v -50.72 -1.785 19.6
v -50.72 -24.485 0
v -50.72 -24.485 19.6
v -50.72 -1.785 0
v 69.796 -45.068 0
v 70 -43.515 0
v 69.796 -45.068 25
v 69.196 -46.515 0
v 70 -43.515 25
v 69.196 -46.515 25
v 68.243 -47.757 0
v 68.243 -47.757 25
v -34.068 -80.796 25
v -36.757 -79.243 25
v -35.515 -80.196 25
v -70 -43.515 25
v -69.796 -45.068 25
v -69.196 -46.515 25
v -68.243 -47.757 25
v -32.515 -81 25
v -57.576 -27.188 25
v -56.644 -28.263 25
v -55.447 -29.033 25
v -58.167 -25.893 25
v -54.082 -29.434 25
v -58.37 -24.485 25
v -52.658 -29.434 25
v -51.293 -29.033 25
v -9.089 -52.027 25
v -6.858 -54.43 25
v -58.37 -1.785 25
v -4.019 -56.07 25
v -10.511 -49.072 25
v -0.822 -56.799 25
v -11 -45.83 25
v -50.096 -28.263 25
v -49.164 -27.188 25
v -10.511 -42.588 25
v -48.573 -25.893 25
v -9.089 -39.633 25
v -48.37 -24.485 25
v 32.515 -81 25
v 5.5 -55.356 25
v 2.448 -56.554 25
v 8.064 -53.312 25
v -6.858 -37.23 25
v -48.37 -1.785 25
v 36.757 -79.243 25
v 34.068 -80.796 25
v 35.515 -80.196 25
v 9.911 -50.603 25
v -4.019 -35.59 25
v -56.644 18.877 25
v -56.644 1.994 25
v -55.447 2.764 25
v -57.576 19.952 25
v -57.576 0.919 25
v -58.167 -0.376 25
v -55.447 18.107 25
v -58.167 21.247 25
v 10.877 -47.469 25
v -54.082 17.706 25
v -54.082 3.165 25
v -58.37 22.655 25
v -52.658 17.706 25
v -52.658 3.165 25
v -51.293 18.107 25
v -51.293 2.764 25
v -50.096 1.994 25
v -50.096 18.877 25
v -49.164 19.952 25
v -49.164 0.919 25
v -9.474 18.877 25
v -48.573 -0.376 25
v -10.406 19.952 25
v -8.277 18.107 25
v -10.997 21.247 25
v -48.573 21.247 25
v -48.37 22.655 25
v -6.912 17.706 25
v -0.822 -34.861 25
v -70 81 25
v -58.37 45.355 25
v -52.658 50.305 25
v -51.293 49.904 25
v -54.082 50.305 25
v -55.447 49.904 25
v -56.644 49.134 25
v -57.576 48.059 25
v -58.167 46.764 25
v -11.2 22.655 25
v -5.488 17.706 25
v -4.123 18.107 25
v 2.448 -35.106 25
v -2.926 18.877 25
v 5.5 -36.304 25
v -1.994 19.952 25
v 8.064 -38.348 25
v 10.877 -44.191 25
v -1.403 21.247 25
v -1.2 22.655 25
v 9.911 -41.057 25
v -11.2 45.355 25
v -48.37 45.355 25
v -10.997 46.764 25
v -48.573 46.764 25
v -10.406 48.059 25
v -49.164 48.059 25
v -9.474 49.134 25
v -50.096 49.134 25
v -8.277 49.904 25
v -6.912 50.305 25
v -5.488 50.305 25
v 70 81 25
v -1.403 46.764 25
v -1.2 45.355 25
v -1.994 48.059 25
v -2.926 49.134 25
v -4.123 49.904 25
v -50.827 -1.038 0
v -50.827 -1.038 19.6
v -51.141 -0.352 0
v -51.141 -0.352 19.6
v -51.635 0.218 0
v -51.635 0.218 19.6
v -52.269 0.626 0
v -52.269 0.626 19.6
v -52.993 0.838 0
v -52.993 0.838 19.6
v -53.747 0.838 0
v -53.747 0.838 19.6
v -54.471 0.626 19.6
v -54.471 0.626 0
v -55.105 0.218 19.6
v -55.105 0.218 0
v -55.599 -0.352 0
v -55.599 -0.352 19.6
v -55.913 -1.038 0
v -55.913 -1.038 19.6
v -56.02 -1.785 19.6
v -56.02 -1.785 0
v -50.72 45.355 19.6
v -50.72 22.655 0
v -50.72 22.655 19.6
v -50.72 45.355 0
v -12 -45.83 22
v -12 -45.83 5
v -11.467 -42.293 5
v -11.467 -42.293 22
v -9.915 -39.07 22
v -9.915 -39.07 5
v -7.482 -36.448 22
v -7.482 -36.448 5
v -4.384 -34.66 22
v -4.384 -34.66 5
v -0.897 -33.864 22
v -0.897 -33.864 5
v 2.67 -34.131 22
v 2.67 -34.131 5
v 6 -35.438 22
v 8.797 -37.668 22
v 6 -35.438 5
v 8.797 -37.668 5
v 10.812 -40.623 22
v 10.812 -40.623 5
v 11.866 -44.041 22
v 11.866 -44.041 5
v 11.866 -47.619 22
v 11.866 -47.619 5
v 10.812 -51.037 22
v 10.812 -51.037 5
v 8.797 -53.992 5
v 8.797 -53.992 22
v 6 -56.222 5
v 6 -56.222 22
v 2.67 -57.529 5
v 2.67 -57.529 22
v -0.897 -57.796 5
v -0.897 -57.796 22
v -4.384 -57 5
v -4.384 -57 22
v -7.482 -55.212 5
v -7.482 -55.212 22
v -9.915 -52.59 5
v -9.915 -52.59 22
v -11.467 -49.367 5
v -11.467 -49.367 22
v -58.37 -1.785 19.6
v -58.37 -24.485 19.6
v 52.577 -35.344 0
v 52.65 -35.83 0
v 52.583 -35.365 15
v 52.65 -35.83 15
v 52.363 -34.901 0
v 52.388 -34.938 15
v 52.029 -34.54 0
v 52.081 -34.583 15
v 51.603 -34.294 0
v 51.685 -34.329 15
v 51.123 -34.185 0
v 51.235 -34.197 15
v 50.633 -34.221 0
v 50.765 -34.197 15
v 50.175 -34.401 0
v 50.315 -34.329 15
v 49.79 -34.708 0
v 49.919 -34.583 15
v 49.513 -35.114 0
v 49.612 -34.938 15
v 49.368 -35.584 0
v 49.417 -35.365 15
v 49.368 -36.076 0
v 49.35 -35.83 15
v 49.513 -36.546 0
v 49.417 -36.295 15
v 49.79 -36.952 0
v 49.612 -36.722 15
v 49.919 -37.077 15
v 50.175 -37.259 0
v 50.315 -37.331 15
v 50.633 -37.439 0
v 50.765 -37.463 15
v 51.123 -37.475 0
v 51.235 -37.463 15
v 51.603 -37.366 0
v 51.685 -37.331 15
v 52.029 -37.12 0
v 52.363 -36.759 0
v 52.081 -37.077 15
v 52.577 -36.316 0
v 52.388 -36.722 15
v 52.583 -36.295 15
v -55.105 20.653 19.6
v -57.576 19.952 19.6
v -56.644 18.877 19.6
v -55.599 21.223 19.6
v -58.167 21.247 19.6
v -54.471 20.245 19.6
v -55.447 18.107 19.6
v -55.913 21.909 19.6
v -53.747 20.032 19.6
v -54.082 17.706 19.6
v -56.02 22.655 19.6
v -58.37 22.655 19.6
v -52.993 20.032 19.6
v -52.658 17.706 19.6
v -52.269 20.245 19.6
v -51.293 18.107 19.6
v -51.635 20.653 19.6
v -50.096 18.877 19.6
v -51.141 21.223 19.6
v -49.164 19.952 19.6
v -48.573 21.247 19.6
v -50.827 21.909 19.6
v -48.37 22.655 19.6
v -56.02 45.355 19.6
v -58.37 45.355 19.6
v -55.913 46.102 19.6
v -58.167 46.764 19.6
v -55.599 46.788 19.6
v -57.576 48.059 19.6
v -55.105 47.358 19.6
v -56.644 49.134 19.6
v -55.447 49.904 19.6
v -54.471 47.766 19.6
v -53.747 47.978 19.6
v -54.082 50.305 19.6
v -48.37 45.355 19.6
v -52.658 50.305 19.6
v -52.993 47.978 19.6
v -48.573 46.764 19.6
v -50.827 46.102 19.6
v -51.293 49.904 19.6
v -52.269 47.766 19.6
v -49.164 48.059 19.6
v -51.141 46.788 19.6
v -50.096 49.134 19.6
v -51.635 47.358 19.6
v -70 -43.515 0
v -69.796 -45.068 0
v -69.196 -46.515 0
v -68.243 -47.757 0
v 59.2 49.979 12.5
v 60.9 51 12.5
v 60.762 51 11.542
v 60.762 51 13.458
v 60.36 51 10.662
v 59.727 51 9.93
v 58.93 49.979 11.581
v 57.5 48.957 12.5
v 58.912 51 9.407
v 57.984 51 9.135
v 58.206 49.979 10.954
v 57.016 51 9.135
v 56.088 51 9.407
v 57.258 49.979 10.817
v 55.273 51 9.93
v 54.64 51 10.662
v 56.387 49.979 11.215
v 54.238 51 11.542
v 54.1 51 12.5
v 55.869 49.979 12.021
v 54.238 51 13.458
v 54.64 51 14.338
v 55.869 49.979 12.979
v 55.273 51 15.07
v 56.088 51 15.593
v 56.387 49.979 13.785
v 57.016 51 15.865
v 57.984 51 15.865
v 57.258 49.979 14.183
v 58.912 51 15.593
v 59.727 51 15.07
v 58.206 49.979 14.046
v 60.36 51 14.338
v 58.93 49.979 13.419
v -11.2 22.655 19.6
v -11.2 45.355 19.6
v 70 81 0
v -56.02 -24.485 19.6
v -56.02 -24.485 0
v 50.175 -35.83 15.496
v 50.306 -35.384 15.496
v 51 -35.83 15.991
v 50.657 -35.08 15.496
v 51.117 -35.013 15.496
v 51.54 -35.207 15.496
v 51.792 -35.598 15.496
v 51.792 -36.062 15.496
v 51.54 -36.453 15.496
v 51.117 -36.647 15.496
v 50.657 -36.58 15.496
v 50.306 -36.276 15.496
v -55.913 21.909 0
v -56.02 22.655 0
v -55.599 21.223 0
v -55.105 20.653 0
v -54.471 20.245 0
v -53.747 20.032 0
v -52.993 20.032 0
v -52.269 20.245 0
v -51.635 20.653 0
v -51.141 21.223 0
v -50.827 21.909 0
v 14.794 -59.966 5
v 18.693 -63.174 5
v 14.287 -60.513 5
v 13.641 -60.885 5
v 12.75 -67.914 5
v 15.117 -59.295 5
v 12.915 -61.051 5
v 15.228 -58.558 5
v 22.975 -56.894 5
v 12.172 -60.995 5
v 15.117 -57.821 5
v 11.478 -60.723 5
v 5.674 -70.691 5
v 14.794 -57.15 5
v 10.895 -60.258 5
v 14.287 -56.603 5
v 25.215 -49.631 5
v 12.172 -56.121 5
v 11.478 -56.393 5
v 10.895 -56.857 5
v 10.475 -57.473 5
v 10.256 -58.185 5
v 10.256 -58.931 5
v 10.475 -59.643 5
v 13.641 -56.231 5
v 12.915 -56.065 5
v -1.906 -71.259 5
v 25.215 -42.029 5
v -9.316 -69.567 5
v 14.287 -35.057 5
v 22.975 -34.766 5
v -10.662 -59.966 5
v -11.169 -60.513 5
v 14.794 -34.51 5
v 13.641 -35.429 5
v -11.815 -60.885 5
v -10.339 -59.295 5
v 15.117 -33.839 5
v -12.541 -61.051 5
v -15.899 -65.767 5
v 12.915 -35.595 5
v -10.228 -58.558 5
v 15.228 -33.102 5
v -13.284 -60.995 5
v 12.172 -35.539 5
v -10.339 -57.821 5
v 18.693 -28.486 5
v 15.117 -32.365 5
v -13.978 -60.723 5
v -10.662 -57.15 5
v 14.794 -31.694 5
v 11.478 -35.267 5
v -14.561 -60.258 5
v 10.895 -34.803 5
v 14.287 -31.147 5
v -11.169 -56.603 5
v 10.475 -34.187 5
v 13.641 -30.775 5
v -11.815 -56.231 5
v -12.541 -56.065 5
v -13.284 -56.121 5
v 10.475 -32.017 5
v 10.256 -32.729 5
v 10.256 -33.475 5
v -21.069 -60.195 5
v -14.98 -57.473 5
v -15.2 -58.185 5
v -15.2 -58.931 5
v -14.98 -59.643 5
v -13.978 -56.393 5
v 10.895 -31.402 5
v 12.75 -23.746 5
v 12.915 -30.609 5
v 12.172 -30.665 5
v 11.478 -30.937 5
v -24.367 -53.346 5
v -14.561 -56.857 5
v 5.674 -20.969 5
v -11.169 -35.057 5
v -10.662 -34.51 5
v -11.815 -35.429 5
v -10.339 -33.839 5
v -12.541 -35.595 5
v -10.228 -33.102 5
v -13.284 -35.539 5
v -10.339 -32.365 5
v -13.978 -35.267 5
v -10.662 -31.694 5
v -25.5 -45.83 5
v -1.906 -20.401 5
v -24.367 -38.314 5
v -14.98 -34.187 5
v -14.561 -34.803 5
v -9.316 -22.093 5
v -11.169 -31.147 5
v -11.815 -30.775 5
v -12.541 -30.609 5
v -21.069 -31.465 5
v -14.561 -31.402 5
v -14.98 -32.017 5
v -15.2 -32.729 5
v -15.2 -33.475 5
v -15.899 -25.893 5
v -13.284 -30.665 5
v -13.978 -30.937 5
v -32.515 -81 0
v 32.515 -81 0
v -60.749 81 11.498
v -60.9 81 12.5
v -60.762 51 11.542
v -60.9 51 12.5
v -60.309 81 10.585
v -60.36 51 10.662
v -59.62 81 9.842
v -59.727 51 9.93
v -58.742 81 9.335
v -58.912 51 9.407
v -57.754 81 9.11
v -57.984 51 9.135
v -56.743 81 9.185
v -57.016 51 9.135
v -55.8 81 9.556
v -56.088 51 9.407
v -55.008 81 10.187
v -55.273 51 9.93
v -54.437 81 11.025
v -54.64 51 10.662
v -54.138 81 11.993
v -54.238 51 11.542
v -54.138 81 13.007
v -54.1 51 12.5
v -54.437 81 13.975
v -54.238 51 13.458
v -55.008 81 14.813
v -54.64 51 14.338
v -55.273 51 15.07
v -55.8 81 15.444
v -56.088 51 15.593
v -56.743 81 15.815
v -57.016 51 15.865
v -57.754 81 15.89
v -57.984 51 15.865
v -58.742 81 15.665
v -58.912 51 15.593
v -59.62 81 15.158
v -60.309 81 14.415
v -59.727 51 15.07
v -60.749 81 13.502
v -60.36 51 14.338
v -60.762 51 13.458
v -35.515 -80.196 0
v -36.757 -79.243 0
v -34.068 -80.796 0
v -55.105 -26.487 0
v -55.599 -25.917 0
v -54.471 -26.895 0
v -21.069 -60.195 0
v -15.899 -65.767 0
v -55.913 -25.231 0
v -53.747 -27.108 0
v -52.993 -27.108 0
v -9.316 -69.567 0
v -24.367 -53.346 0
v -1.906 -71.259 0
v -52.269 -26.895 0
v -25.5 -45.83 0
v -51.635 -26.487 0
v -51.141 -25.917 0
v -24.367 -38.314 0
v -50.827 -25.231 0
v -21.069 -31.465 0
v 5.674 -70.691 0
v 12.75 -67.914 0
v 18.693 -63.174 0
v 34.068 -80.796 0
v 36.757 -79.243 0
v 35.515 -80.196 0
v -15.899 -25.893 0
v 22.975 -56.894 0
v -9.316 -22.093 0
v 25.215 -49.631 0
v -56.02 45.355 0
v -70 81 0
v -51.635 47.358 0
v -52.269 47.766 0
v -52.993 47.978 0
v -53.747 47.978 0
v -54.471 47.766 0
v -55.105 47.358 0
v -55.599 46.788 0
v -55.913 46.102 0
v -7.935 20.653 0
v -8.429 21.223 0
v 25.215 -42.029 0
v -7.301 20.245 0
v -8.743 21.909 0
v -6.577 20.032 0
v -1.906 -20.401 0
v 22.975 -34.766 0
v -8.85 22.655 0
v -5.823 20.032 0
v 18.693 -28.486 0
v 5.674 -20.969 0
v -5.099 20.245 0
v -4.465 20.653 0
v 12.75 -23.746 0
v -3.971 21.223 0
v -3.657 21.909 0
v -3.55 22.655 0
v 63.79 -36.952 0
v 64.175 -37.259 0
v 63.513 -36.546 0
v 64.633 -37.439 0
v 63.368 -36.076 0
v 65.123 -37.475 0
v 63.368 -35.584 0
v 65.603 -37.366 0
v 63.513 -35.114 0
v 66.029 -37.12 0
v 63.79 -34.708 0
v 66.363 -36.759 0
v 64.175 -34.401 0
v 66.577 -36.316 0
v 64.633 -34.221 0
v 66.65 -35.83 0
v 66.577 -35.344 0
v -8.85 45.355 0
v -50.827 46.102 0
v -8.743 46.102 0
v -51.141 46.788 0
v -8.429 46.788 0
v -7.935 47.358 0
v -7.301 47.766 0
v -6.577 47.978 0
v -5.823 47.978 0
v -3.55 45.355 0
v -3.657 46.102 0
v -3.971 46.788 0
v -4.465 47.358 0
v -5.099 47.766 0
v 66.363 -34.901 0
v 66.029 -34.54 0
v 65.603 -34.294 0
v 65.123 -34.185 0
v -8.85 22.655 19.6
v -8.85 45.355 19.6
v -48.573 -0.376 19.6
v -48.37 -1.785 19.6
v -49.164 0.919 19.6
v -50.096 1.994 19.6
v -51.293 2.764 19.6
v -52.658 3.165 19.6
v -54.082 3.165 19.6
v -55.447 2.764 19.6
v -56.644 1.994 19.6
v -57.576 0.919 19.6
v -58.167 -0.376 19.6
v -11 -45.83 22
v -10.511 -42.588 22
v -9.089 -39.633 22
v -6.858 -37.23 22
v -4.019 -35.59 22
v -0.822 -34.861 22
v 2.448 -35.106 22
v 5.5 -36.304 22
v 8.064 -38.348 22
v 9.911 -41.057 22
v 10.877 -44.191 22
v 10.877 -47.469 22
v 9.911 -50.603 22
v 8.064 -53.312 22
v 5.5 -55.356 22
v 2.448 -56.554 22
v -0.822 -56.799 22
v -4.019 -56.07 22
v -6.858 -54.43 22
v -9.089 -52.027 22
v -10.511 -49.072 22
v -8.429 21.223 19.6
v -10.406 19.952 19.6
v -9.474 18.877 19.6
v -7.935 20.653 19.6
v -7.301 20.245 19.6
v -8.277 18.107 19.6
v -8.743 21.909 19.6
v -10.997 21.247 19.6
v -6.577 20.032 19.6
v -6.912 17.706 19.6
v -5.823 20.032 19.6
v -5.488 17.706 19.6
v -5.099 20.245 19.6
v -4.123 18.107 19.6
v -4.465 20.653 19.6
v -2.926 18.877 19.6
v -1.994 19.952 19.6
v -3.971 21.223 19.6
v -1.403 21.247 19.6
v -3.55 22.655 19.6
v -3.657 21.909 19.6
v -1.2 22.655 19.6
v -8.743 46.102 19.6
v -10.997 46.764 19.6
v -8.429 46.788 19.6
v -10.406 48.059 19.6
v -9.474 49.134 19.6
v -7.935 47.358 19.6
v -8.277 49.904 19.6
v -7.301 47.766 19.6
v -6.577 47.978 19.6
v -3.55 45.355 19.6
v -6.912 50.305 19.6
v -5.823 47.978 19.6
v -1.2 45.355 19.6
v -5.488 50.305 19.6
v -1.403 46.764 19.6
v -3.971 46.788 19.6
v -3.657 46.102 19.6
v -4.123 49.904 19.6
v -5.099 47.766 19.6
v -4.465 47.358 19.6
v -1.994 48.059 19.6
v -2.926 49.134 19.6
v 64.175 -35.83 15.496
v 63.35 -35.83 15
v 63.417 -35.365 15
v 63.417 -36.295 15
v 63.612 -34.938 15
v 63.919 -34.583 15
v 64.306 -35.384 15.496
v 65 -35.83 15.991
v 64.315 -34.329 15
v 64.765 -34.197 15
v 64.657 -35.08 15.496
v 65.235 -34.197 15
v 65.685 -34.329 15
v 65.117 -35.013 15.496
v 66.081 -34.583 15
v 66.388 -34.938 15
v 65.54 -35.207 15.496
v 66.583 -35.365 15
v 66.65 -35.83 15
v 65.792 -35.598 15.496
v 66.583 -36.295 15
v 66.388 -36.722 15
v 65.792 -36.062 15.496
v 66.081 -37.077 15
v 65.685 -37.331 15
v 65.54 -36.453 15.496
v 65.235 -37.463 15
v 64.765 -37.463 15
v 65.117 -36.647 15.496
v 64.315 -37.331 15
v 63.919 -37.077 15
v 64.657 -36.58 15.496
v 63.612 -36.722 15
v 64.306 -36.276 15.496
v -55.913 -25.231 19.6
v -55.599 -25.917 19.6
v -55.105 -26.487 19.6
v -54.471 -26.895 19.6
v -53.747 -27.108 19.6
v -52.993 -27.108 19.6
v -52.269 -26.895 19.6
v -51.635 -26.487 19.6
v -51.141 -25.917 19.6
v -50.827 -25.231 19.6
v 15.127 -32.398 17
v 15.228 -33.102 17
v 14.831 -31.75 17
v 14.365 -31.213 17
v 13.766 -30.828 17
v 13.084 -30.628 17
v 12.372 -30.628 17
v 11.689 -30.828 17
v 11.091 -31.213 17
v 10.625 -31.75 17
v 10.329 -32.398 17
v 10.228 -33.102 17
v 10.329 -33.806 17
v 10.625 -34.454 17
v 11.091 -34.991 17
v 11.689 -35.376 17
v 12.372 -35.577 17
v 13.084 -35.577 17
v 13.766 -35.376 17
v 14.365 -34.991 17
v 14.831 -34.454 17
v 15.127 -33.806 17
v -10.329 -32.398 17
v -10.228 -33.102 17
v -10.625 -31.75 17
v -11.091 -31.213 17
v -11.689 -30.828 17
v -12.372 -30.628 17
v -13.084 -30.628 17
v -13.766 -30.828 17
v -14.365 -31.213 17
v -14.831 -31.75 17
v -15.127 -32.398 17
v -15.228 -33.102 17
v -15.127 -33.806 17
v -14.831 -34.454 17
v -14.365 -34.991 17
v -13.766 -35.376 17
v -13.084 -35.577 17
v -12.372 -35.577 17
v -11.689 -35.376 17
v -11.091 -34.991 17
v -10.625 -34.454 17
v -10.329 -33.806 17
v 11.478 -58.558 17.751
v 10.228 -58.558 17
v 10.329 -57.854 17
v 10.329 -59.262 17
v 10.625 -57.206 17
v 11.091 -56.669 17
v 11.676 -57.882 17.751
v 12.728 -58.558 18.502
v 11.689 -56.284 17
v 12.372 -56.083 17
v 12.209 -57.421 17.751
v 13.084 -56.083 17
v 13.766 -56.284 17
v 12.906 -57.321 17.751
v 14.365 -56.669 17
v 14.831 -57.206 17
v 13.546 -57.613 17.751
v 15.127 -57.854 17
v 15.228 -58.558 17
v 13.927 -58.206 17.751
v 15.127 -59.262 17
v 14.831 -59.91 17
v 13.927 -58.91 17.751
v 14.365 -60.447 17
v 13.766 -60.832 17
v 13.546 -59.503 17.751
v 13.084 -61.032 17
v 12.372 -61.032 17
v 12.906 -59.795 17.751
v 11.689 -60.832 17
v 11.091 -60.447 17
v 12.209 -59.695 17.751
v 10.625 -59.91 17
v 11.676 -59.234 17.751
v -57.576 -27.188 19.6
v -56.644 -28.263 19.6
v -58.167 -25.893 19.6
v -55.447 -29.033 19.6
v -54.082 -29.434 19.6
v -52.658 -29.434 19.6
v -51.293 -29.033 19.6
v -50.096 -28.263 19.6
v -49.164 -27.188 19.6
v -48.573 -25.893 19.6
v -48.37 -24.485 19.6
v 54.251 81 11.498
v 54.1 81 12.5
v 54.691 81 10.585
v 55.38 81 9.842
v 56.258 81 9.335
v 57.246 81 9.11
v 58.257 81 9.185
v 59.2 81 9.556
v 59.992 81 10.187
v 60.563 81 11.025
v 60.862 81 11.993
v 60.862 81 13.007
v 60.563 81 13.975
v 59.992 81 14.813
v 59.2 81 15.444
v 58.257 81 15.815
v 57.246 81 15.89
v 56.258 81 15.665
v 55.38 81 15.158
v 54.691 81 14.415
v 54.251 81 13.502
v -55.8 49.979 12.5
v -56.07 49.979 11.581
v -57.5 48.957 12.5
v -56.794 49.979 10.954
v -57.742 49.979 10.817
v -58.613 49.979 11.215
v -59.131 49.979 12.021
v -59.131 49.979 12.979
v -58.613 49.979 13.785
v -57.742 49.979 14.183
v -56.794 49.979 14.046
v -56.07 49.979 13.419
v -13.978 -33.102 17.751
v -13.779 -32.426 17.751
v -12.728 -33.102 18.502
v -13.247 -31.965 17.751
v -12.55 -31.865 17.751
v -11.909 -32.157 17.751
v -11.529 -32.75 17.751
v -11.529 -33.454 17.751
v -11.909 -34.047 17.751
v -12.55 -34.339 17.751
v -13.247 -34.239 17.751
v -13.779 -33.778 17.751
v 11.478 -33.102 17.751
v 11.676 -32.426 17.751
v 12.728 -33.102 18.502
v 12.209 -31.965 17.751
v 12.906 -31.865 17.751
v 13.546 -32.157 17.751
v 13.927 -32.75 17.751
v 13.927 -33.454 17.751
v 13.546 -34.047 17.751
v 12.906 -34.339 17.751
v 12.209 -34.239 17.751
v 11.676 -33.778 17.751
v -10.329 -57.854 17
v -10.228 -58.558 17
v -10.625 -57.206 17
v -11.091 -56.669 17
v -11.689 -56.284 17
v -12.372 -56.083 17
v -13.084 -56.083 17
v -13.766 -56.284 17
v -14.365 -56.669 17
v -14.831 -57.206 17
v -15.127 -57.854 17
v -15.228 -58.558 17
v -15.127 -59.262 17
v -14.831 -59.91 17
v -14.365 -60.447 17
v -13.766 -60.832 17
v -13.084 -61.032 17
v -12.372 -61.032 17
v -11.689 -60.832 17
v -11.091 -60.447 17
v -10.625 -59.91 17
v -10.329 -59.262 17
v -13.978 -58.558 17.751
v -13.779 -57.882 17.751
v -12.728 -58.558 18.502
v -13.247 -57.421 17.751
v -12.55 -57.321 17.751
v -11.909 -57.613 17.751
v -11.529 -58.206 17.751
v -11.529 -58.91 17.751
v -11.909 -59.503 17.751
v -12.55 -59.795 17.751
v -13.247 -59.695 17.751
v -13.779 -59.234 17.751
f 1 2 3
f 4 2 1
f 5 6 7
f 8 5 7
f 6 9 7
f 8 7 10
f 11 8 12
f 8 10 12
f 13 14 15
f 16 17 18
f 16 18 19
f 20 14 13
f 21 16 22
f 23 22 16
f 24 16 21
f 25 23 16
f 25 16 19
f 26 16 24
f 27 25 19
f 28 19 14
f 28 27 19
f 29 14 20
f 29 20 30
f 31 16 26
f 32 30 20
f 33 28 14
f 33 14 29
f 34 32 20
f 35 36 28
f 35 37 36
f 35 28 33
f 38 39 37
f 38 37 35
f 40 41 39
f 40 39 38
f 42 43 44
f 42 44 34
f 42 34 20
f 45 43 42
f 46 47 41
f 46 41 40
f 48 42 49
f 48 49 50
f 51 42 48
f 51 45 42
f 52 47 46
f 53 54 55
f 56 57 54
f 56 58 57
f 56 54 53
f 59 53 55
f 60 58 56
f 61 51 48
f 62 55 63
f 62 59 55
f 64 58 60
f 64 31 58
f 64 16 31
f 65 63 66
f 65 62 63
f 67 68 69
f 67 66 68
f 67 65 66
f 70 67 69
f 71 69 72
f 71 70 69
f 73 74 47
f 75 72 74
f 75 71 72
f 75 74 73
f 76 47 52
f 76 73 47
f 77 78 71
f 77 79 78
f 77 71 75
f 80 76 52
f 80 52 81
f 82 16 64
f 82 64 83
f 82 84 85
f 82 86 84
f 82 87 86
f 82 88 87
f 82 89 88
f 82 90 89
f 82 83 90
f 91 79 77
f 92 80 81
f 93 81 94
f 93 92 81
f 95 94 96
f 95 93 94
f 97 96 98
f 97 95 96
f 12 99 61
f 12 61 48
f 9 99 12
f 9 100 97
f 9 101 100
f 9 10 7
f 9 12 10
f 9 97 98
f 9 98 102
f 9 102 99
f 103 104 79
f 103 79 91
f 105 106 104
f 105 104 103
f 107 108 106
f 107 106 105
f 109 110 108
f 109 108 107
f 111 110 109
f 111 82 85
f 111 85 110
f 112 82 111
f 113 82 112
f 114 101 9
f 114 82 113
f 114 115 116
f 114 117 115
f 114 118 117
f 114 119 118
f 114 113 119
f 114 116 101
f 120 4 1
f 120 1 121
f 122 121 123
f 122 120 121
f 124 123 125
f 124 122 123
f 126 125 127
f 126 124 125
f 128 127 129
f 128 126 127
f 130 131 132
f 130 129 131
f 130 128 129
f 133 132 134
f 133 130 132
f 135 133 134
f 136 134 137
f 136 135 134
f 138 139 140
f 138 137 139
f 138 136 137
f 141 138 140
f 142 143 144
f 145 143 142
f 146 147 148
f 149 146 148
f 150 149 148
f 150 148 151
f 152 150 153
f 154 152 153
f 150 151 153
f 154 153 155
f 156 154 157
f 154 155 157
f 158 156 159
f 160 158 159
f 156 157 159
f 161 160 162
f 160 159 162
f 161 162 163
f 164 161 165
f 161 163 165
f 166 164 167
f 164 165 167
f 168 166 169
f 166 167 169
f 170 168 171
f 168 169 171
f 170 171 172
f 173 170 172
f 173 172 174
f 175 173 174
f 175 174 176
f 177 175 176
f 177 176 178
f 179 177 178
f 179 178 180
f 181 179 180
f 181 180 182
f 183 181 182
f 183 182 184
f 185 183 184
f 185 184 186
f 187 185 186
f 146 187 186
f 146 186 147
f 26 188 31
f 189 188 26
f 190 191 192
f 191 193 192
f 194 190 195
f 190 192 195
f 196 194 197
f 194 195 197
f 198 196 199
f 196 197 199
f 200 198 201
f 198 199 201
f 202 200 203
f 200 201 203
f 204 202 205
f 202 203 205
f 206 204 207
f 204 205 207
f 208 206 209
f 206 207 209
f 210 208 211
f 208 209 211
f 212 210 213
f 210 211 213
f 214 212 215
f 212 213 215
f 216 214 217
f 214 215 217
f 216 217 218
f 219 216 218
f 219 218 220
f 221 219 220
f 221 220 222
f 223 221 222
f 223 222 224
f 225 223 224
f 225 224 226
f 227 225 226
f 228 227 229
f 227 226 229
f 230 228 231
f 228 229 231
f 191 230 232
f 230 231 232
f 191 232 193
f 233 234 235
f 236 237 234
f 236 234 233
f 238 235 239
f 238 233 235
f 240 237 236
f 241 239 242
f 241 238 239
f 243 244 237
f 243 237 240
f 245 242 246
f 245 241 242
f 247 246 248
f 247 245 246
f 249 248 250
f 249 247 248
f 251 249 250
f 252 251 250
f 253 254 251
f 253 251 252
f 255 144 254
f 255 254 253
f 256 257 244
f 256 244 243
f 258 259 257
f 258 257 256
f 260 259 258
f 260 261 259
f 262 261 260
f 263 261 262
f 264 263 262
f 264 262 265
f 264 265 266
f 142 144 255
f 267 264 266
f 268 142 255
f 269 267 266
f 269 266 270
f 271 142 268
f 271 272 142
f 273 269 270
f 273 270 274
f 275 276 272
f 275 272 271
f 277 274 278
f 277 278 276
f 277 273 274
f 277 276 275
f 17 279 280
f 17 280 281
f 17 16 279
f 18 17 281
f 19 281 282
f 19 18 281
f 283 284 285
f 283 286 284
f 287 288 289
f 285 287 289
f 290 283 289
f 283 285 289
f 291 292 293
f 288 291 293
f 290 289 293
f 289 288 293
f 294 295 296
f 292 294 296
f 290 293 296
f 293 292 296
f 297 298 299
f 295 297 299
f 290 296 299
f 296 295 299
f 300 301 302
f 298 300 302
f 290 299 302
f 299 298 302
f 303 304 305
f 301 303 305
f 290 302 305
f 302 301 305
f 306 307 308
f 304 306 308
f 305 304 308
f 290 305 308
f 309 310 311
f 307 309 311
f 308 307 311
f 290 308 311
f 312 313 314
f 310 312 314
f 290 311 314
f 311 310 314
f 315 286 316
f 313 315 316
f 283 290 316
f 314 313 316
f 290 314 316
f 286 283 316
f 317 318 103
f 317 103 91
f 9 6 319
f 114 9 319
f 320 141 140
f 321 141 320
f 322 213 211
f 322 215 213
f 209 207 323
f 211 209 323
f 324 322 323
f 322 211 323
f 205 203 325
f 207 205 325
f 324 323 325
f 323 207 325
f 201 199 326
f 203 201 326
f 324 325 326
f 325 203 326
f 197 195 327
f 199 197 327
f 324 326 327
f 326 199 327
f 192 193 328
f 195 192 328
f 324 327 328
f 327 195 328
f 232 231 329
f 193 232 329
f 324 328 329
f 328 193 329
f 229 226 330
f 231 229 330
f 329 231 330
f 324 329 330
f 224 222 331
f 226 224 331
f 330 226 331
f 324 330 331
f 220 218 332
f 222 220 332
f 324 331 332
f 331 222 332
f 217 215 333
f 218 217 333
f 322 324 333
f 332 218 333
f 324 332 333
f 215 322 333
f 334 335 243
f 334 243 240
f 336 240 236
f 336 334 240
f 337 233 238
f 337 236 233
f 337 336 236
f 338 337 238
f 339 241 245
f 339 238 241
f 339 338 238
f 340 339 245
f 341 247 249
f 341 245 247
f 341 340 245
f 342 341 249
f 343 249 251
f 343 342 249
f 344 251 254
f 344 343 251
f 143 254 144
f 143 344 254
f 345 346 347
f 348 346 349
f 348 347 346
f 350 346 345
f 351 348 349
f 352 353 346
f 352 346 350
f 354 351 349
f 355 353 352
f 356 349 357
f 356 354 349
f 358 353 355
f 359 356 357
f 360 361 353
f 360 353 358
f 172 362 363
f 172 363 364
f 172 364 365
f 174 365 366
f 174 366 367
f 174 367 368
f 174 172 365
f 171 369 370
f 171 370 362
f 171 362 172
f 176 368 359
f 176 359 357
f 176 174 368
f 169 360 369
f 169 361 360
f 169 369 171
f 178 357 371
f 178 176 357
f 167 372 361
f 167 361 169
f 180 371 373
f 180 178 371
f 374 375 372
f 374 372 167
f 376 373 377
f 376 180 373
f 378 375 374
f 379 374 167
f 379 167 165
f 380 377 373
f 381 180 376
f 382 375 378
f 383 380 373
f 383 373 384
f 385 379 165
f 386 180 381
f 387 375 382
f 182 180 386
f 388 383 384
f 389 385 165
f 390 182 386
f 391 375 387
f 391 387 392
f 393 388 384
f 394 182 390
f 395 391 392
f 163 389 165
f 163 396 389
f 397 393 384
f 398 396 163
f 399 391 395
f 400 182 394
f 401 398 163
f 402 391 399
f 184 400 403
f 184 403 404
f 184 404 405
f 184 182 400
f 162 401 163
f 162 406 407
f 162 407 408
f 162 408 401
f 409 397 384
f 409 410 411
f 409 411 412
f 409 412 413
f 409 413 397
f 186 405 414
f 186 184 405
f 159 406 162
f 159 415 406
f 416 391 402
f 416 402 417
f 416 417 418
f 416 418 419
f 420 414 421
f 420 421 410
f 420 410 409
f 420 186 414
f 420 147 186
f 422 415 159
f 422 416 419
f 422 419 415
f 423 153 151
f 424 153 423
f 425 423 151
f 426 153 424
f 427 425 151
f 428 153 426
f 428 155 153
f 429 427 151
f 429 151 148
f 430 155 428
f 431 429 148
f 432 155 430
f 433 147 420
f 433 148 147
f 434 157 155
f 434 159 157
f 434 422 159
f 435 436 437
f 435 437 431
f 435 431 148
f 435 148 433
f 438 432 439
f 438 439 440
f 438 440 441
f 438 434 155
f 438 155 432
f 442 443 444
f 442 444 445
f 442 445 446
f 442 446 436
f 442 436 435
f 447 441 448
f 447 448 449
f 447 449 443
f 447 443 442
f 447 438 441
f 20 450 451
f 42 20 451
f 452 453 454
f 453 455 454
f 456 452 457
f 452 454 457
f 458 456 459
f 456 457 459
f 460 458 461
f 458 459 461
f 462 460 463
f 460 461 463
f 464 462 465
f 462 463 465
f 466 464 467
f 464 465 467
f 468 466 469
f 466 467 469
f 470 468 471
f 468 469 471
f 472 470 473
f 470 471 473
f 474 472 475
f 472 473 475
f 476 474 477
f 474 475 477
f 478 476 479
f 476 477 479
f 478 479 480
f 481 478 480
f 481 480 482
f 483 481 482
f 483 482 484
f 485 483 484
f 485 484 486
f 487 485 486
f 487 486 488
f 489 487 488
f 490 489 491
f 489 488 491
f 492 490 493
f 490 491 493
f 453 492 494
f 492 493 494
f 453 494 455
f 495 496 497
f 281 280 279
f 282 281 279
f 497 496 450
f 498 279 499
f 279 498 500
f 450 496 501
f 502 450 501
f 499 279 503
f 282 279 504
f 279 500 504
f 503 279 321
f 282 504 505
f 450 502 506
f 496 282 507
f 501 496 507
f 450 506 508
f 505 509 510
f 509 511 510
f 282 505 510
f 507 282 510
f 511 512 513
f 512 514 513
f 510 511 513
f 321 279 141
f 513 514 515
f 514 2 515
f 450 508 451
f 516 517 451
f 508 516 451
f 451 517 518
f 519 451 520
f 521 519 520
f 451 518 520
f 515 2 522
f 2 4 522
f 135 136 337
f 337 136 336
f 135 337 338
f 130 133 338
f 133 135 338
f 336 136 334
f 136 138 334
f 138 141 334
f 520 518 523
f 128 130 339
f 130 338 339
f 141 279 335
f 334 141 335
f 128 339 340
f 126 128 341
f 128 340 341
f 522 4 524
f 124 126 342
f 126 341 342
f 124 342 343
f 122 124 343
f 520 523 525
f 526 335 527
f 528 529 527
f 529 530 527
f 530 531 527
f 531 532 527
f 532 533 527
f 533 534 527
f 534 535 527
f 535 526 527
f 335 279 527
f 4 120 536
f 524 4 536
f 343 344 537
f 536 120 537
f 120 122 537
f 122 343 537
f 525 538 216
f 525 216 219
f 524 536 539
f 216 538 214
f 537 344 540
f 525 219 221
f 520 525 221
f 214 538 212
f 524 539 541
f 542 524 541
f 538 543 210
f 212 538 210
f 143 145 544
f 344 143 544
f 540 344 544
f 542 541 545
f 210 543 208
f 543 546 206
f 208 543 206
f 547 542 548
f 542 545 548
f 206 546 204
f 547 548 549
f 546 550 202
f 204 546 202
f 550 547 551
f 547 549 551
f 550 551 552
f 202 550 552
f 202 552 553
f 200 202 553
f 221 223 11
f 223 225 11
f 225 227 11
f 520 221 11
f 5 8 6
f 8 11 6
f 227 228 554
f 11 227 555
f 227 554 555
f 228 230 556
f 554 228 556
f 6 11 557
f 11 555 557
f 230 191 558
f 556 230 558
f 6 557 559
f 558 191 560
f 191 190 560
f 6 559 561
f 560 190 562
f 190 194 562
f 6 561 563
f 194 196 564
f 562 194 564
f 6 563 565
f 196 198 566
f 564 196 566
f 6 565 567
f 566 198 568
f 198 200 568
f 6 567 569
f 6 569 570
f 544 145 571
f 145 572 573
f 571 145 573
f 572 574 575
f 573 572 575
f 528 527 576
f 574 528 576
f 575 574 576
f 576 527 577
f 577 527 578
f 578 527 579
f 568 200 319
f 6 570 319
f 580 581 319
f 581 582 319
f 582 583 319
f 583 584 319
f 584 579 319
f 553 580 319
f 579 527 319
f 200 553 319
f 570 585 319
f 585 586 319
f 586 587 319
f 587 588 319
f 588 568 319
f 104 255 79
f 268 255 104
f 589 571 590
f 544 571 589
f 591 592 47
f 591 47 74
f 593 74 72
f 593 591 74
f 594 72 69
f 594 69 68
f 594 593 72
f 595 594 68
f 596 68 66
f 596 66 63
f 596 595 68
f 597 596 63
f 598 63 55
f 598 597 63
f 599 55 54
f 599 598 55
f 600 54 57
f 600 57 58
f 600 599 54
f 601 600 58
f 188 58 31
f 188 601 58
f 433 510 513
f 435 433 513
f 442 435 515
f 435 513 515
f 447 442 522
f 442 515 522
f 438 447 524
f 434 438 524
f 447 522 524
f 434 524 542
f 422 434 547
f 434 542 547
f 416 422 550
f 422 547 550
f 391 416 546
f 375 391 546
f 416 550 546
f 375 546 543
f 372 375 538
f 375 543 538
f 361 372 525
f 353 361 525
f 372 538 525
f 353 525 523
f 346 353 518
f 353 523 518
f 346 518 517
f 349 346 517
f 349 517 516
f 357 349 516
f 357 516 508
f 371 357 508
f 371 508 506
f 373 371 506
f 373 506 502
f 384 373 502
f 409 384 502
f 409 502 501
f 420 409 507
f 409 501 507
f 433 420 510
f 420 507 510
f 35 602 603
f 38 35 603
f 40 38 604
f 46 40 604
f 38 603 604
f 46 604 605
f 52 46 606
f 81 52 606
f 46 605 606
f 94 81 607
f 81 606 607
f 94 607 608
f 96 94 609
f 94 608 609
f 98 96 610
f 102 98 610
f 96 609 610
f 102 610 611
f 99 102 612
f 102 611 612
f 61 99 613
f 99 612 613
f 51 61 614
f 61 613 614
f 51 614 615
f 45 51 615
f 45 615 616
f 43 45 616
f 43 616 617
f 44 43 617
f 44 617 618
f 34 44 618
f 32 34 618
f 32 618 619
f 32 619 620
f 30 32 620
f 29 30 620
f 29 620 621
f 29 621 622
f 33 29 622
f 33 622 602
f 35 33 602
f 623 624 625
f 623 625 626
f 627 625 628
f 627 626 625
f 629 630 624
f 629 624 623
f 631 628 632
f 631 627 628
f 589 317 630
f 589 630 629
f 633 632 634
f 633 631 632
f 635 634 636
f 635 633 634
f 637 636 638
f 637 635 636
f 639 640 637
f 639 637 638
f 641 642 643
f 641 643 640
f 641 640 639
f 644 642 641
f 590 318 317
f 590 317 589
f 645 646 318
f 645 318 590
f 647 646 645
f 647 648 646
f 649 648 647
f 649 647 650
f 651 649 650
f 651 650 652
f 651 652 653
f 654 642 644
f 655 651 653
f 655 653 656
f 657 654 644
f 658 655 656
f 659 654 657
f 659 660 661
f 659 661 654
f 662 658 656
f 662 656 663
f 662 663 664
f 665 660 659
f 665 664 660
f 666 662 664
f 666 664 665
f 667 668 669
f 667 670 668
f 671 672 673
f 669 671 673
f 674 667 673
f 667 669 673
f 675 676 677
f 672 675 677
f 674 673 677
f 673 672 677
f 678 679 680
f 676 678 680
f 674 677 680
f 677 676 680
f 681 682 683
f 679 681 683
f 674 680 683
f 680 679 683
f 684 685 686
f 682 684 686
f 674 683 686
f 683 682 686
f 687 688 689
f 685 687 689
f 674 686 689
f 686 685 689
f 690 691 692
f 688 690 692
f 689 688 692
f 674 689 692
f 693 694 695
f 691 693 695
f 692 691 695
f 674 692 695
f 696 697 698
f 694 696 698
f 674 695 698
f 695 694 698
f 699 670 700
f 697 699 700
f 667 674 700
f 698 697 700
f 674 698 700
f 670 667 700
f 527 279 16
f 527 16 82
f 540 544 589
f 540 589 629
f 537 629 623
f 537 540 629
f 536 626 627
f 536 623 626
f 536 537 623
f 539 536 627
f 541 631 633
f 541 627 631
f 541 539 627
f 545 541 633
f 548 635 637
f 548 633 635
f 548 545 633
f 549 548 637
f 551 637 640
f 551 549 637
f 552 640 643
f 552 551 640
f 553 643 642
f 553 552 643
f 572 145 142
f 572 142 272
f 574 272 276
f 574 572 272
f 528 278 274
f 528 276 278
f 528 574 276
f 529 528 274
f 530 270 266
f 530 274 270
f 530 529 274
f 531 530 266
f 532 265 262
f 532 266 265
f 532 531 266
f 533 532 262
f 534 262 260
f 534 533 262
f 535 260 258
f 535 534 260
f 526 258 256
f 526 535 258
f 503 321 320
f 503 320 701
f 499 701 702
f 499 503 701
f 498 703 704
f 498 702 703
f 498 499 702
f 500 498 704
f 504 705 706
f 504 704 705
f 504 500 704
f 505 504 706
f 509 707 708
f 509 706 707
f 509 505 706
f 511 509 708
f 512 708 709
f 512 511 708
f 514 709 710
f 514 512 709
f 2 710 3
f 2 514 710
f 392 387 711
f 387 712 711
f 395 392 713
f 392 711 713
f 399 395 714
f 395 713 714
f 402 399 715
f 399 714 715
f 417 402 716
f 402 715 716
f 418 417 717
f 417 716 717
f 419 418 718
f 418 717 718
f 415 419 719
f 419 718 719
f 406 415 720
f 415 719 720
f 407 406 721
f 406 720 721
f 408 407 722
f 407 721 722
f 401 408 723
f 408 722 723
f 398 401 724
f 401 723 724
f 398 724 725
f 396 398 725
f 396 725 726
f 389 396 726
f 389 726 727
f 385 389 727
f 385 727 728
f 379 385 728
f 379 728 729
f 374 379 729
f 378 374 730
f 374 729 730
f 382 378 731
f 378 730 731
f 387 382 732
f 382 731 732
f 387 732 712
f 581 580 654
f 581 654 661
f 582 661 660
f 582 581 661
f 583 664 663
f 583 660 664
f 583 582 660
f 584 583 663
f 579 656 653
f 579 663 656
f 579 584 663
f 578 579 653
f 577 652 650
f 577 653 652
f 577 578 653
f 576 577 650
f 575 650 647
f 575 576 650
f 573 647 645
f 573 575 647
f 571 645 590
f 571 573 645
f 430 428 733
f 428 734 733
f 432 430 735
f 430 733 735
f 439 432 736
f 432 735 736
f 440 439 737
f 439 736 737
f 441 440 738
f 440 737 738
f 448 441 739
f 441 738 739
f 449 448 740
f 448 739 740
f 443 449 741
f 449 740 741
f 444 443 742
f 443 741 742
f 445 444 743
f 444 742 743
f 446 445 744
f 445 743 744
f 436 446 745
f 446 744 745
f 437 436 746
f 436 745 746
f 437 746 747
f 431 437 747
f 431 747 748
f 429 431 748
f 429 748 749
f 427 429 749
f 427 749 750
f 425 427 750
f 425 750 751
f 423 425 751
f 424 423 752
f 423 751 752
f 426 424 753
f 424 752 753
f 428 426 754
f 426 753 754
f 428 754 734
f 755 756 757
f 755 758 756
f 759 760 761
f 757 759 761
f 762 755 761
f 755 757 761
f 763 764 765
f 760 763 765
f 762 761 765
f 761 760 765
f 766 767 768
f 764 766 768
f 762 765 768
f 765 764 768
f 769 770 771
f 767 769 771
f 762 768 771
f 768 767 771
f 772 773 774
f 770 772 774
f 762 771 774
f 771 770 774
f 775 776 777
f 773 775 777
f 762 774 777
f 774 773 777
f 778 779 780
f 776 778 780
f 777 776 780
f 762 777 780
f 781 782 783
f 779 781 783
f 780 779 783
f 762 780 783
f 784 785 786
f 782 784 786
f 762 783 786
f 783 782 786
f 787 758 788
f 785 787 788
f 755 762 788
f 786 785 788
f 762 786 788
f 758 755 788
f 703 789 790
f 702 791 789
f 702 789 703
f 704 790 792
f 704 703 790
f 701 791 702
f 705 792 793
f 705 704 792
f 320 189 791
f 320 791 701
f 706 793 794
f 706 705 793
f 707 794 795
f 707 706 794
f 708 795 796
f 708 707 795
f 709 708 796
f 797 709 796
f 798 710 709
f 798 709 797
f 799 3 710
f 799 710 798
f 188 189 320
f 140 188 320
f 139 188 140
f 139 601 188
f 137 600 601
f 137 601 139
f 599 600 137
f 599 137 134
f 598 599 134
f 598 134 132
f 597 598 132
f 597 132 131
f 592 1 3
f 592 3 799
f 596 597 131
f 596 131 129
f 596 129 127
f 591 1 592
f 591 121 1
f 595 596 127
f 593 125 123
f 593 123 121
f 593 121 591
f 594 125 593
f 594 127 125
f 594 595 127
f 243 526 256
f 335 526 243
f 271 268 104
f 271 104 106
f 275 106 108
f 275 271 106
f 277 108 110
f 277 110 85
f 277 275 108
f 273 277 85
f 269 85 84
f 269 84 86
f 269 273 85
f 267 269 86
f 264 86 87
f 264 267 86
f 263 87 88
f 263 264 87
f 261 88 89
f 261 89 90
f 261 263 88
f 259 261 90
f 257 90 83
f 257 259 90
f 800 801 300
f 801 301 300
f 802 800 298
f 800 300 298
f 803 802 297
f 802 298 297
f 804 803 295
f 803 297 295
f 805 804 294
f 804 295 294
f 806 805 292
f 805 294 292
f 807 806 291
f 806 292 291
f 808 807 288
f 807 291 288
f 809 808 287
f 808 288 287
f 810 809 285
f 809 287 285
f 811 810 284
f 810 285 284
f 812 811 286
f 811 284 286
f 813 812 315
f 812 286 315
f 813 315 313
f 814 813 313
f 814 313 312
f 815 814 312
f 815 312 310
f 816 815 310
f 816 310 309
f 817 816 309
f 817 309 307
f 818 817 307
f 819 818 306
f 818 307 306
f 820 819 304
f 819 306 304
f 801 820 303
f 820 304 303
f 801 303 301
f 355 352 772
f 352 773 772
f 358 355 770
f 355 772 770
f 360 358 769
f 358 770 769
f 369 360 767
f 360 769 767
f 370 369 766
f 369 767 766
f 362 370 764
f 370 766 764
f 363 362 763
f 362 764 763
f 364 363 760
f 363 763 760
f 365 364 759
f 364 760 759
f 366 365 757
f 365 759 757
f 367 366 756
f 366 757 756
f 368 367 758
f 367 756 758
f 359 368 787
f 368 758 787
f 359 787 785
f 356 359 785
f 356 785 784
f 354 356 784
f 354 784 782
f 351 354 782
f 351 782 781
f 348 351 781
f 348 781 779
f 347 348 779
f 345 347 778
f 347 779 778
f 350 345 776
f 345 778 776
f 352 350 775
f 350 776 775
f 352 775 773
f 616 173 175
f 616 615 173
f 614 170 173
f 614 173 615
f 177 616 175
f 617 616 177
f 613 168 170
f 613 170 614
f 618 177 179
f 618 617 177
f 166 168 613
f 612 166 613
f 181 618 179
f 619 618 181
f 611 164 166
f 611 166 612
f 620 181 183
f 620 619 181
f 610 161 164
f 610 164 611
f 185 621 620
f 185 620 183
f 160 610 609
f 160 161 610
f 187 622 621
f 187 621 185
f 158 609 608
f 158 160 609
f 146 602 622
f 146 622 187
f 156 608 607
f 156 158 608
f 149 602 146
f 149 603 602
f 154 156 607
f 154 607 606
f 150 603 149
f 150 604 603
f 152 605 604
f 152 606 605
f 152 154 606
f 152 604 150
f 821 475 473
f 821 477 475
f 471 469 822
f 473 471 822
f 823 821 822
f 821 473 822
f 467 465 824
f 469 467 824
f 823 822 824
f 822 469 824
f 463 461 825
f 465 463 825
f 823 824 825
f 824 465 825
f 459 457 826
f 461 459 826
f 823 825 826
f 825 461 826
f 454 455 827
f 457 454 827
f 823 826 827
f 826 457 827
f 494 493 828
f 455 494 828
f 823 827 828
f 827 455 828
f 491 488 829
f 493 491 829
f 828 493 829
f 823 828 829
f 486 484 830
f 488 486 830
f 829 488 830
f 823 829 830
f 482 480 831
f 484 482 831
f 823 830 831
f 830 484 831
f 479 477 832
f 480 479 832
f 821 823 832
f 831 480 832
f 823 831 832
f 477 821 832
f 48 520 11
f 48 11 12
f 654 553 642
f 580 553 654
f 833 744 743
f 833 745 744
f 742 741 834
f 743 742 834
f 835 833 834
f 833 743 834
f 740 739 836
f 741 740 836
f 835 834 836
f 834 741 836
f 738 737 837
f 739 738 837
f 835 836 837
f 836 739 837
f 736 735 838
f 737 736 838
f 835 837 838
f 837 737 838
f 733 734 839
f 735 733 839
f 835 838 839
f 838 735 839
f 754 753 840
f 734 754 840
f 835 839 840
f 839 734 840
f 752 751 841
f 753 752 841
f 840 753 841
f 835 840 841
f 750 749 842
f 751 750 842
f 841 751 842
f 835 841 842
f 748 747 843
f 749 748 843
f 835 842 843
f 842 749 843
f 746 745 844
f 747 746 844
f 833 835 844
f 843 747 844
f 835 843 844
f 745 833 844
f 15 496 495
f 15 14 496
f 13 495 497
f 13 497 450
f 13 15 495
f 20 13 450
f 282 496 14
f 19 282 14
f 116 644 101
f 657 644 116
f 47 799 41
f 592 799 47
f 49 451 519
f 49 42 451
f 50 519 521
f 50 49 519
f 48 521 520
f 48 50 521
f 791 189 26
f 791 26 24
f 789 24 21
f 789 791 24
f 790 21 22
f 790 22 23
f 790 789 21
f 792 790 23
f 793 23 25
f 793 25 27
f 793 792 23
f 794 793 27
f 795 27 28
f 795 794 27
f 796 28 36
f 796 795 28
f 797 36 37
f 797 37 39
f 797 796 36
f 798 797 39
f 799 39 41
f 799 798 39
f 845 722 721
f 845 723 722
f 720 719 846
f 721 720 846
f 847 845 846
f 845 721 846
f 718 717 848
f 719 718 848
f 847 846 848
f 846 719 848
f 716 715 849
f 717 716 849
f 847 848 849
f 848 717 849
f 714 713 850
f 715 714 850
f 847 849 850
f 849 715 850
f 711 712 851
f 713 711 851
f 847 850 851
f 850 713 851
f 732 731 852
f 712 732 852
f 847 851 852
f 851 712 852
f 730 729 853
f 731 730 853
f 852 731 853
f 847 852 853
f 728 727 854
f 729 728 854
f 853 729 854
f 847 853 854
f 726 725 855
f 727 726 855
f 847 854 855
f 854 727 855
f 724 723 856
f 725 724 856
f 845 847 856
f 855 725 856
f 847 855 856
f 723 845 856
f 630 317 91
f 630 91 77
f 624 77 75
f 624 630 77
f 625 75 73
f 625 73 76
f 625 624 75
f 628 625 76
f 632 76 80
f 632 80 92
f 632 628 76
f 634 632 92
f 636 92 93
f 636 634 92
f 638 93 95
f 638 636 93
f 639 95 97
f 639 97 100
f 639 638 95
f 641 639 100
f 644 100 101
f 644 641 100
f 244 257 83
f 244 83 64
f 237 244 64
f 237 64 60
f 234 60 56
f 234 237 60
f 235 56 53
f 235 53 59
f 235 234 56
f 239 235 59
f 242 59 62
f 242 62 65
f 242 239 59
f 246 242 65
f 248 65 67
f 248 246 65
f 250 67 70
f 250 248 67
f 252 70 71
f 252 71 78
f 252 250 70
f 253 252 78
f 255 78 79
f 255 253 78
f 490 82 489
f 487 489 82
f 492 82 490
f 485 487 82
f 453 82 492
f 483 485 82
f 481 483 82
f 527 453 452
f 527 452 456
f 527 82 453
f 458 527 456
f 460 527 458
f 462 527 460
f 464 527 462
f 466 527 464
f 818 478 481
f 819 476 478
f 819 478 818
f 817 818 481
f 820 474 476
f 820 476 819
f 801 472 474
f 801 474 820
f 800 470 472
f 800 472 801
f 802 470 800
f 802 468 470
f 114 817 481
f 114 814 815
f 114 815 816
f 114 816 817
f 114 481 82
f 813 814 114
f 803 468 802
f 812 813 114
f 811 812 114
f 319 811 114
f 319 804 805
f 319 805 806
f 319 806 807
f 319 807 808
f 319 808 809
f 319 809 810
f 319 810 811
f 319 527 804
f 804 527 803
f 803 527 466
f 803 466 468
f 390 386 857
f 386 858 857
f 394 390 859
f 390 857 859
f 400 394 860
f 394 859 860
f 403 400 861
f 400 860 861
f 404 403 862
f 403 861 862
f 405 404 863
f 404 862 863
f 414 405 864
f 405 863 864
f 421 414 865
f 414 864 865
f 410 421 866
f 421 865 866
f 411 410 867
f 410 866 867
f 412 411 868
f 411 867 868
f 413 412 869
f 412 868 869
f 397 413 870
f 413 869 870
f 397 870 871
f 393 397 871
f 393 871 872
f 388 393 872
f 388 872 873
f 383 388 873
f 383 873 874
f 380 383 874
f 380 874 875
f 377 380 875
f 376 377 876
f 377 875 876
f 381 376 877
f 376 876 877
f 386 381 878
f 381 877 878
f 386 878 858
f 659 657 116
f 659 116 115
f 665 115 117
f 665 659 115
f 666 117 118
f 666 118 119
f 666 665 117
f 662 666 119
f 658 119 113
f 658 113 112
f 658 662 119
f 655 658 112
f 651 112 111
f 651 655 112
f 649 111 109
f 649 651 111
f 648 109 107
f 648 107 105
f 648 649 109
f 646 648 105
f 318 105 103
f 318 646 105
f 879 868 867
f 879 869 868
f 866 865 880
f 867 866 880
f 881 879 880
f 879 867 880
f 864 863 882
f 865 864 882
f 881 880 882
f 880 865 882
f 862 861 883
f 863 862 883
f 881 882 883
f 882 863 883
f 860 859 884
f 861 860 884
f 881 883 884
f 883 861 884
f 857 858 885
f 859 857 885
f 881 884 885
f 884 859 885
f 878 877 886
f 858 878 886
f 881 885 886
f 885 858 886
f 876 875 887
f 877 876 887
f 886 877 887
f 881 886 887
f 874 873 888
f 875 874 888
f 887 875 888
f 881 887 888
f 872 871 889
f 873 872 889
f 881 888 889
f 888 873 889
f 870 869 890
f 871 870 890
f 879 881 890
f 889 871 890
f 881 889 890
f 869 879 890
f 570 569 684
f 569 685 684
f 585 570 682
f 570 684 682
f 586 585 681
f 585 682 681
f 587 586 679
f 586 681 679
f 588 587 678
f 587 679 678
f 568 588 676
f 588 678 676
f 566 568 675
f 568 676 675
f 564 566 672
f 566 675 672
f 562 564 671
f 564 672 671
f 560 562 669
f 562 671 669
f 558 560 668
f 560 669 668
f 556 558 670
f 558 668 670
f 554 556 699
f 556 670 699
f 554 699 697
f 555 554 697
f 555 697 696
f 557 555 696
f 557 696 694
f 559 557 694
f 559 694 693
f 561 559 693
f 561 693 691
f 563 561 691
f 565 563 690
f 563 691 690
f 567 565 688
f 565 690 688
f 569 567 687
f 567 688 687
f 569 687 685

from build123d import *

# Parameters (mm, degrees)
ESQUISSE1_W                                   = 140
ESQUISSE1_H                                   = 162
BOSS_EXTRU_1_DEPTH                            = 25
TROU_POUR_TARAUDAGE_POUR_TROU_TARAUD_M8_D     = 6.8
TROU_POUR_TARAUDAGE_POUR_TROU_TARAUD_M8_DEPTH = 30
TROU_POUR_TARAUDAGE_POUR_TROU_TARAUD_M8_TIP   = 2.042926105
CHANFREIN1_SIZE                               = 35
CONG_3_R                                      = 6
ESQUISSE15_R                                  = 12
ENL_V_MAT_EXTRU_4_DEPTH                       = 22
ESQUISSE16_R                                  = 11
ENL_V_MAT_EXTRU_5_DEPTH                       = 110.293183685
TROU_POUR_TARAUDAGE_POUR_TROU_TARAUD_M4_D     = 3.3
TROU_POUR_TARAUDAGE_POUR_TROU_TARAUD_M4_DEPTH = 15
TROU_POUR_TARAUDAGE_POUR_TROU_TARAUD_M4_TIP   = 0.991420021
ESQUISSE41_R                                  = 25.5
ENL_V_MAT_EXTRU_15_DEPTH                      = 5
TROU_POUR_TARAUDAGE_POUR_TROU_TARAUD_M6_D     = 5
TROU_POUR_TARAUDAGE_POUR_TROU_TARAUD_M6_DEPTH = 12
TROU_POUR_TARAUDAGE_POUR_TROU_TARAUD_M6_TIP   = 1.502151548
RAINURE_DE_CHAMBRAGE_POUR_VIS_T_TE_HEX_DEPTH  = 25
RAINURE_START                                 = 19.6
RAINURE_DE_CHAMBRAGE_POUR_VIS_T_TE_3_DEPTH    = 5.4


# Read off the part's stored shape, not the designer's step: Rainure de chambrage pour vis à tête hexagonale M52
with BuildPart() as part:
    # Esquisse1 → Boss.-Extru.1 (new body)
    with BuildSketch(Plane.XY):
        Rectangle(ESQUISSE1_W, ESQUISSE1_H)
    extrude(amount=BOSS_EXTRU_1_DEPTH)

    # Trou pour taraudage pour trou taraudé M81
    with Locations(Plane(origin=(0, 81, 0), x_dir=(1, 0, 0), z_dir=(0, 1, 0))):
        with Locations((-57.5, -12.5), (57.5, -12.5)):
            Hole(TROU_POUR_TARAUDAGE_POUR_TROU_TARAUD_M8_D / 2, depth=TROU_POUR_TARAUDAGE_POUR_TROU_TARAUD_M8_DEPTH)
            with Locations((0, 0, -(TROU_POUR_TARAUDAGE_POUR_TROU_TARAUD_M8_DEPTH + TROU_POUR_TARAUDAGE_POUR_TROU_TARAUD_M8_TIP / 2))):  # 118° drill point
                Cone(0, TROU_POUR_TARAUDAGE_POUR_TROU_TARAUD_M8_D / 2, TROU_POUR_TARAUDAGE_POUR_TROU_TARAUD_M8_TIP, mode=Mode.SUBTRACT)

    # Chanfrein1
    chanfrein1_edges = [part.edges().sort_by_distance(p)[0] for p in [
        (70, -81, 12.5),
        (-70, -81, 12.5),
    ]]
    chamfer(chanfrein1_edges, length=CHANFREIN1_SIZE)

    # Congé3
    cong_3_edges = [part.edges().sort_by_distance(p)[0] for p in [
        (35, -81, 12.5),
        (-35, -81, 12.5),
        (-70, -46, 12.5),
        (70, -46, 12.5),
    ]]
    fillet(cong_3_edges, radius=CONG_3_R)

    # Esquisse15 → Enlèv. mat.-Extru.4 (cut)
    with BuildSketch(Plane(origin=(0, 0, 0), x_dir=(-1, 0, 0), z_dir=(0, 0, -1))):
        with Locations((0, -45.83)):
            Circle(ESQUISSE15_R)
    extrude(amount=-ENL_V_MAT_EXTRU_4_DEPTH, mode=Mode.SUBTRACT)

    # Esquisse16 → Enlèv. mat.-Extru.5 (cut, through all)
    with BuildSketch(Plane(origin=(0, 0, 22), x_dir=(-1, 0, 0), z_dir=(0, 0, -1))):
        with Locations((0, -45.83)):
            Circle(ESQUISSE16_R)
    extrude(amount=-ENL_V_MAT_EXTRU_5_DEPTH, mode=Mode.SUBTRACT)

    # Trou pour taraudage pour trou taraudé M41
    with Locations(Plane(origin=(0, 0, 0), x_dir=(-1, 0, 0), z_dir=(0, 0, -1))):
        with Locations((-65, -35.83), (-51, -35.83)):
            Hole(TROU_POUR_TARAUDAGE_POUR_TROU_TARAUD_M4_D / 2, depth=TROU_POUR_TARAUDAGE_POUR_TROU_TARAUD_M4_DEPTH)
            with Locations((0, 0, -(TROU_POUR_TARAUDAGE_POUR_TROU_TARAUD_M4_DEPTH + TROU_POUR_TARAUDAGE_POUR_TROU_TARAUD_M4_TIP / 2))):  # 118° drill point
                Cone(0, TROU_POUR_TARAUDAGE_POUR_TROU_TARAUD_M4_D / 2, TROU_POUR_TARAUDAGE_POUR_TROU_TARAUD_M4_TIP, mode=Mode.SUBTRACT)

    # Esquisse41 → Enlèv. mat.-Extru.15 (cut)
    with BuildSketch(Plane(origin=(0, 0, 0), x_dir=(-1, 0, 0), z_dir=(0, 0, -1))):
        with Locations((0, -45.83)):
            Circle(ESQUISSE41_R)
    extrude(amount=-ENL_V_MAT_EXTRU_15_DEPTH, mode=Mode.SUBTRACT)

    # Trou pour taraudage pour trou taraudé M61
    with Locations(Plane(origin=(0, 0, 5), x_dir=(-1, 0, 0), z_dir=(0, 0, -1))):
        with Locations((12.727922061, -33.102077939), (-12.727922061, -58.557922061), (-12.727922061, -33.102077939), (12.727922061, -58.557922061)):
            Hole(TROU_POUR_TARAUDAGE_POUR_TROU_TARAUD_M6_D / 2, depth=TROU_POUR_TARAUDAGE_POUR_TROU_TARAUD_M6_DEPTH)
            with Locations((0, 0, -(TROU_POUR_TARAUDAGE_POUR_TROU_TARAUD_M6_DEPTH + TROU_POUR_TARAUDAGE_POUR_TROU_TARAUD_M6_TIP / 2))):  # 118° drill point
                Cone(0, TROU_POUR_TARAUDAGE_POUR_TROU_TARAUD_M6_D / 2, TROU_POUR_TARAUDAGE_POUR_TROU_TARAUD_M6_TIP, mode=Mode.SUBTRACT)

    # Rainure de chambrage pour vis _ t_te 2 → Rainure de chambrage pour vis à tête hexagonale M52 (cut)
    with BuildSketch(Plane.XY):
        with BuildLine():
            Line((-50.72, -24.484553863), (-50.72, -1.784553863))
            ThreePointArc((-50.72, -1.784553863), (-53.37, 0.865446137), (-56.02, -1.784553863))
            Line((-56.02, -1.784553863), (-56.02, -24.484553863))
            ThreePointArc((-56.02, -24.484553863), (-53.37, -27.134553863), (-50.72, -24.484553863))
        make_face()
        with BuildLine():
            Line((-50.72, 22.655446137), (-50.72, 45.355446137))
            ThreePointArc((-50.72, 45.355446137), (-53.37, 48.005446137), (-56.02, 45.355446137))
            Line((-56.02, 45.355446137), (-56.02, 22.655446137))
            ThreePointArc((-56.02, 22.655446137), (-53.37, 20.005446137), (-50.72, 22.655446137))
        make_face()
        with BuildLine():
            Line((-8.85, 45.355446137), (-8.85, 22.655446137))
            ThreePointArc((-8.85, 22.655446137), (-6.2, 20.005446137), (-3.55, 22.655446137))
            Line((-3.55, 22.655446137), (-3.55, 45.355446137))
            ThreePointArc((-3.55, 45.355446137), (-6.2, 48.005446137), (-8.85, 45.355446137))
        make_face()
    extrude(amount=RAINURE_DE_CHAMBRAGE_POUR_VIS_T_TE_HEX_DEPTH, mode=Mode.SUBTRACT)

    # Rainure de chambrage pour vis _ t_te 3 o → Rainure de chambrage pour vis _ t_te 3 (cut)
    # profile 1 of 3: a face of its own
    with BuildSketch(Plane.XY.offset(RAINURE_START)):
        with BuildLine():
            Line((-58.37, -1.784553863), (-58.37, -24.484553863))
            ThreePointArc((-58.37, -24.484553863), (-53.37, -29.484553863), (-48.37, -24.484553863))
            Line((-48.37, -24.484553863), (-48.37, -1.784553863))
            ThreePointArc((-48.37, -1.784553863), (-53.37, 3.215446137), (-58.37, -1.784553863))
        make_face()
        with BuildLine():
            ThreePointArc((-56.02, -1.784553863), (-53.37, 0.865446137), (-50.72, -1.784553863))
            Line((-50.72, -1.784553863), (-50.72, -24.484553863))
            ThreePointArc((-50.72, -24.484553863), (-53.37, -27.134553863), (-56.02, -24.484553863))
            Line((-56.02, -24.484553863), (-56.02, -1.784553863))
        make_face(mode=Mode.SUBTRACT)
    # profile 2 of 3: a face of its own
    with BuildSketch(Plane.XY.offset(RAINURE_START)):
        with BuildLine():
            Line((-48.37, 22.655446137), (-48.37, 45.355446137))
            ThreePointArc((-48.37, 45.355446137), (-53.37, 50.355446137), (-58.37, 45.355446137))
            Line((-58.37, 45.355446137), (-58.37, 22.655446137))
            ThreePointArc((-58.37, 22.655446137), (-53.37, 17.655446137), (-48.37, 22.655446137))
        make_face()
        with BuildLine():
            ThreePointArc((-56.02, 45.355446137), (-53.37, 48.005446137), (-50.72, 45.355446137))
            Line((-50.72, 45.355446137), (-50.72, 22.655446137))
            ThreePointArc((-50.72, 22.655446137), (-53.37, 20.005446137), (-56.02, 22.655446137))
            Line((-56.02, 22.655446137), (-56.02, 45.355446137))
        make_face(mode=Mode.SUBTRACT)
    # profile 3 of 3: a face of its own
    with BuildSketch(Plane.XY.offset(RAINURE_START)):
        with BuildLine():
            Line((-11.2, 45.355446137), (-11.2, 22.655446137))
            ThreePointArc((-11.2, 22.655446137), (-6.2, 17.655446137), (-1.2, 22.655446137))
            Line((-1.2, 22.655446137), (-1.2, 45.355446137))
            ThreePointArc((-1.2, 45.355446137), (-6.2, 50.355446137), (-11.2, 45.355446137))
        make_face()
        with BuildLine():
            ThreePointArc((-3.55, 22.655446137), (-6.2, 20.005446137), (-8.85, 22.655446137))
            Line((-8.85, 22.655446137), (-8.85, 45.355446137))
            ThreePointArc((-8.85, 45.355446137), (-6.2, 48.005446137), (-3.55, 45.355446137))
            Line((-3.55, 45.355446137), (-3.55, 22.655446137))
        make_face(mode=Mode.SUBTRACT)
    extrude(amount=RAINURE_DE_CHAMBRAGE_POUR_VIS_T_TE_3_DEPTH, mode=Mode.SUBTRACT)


solid = part.part
